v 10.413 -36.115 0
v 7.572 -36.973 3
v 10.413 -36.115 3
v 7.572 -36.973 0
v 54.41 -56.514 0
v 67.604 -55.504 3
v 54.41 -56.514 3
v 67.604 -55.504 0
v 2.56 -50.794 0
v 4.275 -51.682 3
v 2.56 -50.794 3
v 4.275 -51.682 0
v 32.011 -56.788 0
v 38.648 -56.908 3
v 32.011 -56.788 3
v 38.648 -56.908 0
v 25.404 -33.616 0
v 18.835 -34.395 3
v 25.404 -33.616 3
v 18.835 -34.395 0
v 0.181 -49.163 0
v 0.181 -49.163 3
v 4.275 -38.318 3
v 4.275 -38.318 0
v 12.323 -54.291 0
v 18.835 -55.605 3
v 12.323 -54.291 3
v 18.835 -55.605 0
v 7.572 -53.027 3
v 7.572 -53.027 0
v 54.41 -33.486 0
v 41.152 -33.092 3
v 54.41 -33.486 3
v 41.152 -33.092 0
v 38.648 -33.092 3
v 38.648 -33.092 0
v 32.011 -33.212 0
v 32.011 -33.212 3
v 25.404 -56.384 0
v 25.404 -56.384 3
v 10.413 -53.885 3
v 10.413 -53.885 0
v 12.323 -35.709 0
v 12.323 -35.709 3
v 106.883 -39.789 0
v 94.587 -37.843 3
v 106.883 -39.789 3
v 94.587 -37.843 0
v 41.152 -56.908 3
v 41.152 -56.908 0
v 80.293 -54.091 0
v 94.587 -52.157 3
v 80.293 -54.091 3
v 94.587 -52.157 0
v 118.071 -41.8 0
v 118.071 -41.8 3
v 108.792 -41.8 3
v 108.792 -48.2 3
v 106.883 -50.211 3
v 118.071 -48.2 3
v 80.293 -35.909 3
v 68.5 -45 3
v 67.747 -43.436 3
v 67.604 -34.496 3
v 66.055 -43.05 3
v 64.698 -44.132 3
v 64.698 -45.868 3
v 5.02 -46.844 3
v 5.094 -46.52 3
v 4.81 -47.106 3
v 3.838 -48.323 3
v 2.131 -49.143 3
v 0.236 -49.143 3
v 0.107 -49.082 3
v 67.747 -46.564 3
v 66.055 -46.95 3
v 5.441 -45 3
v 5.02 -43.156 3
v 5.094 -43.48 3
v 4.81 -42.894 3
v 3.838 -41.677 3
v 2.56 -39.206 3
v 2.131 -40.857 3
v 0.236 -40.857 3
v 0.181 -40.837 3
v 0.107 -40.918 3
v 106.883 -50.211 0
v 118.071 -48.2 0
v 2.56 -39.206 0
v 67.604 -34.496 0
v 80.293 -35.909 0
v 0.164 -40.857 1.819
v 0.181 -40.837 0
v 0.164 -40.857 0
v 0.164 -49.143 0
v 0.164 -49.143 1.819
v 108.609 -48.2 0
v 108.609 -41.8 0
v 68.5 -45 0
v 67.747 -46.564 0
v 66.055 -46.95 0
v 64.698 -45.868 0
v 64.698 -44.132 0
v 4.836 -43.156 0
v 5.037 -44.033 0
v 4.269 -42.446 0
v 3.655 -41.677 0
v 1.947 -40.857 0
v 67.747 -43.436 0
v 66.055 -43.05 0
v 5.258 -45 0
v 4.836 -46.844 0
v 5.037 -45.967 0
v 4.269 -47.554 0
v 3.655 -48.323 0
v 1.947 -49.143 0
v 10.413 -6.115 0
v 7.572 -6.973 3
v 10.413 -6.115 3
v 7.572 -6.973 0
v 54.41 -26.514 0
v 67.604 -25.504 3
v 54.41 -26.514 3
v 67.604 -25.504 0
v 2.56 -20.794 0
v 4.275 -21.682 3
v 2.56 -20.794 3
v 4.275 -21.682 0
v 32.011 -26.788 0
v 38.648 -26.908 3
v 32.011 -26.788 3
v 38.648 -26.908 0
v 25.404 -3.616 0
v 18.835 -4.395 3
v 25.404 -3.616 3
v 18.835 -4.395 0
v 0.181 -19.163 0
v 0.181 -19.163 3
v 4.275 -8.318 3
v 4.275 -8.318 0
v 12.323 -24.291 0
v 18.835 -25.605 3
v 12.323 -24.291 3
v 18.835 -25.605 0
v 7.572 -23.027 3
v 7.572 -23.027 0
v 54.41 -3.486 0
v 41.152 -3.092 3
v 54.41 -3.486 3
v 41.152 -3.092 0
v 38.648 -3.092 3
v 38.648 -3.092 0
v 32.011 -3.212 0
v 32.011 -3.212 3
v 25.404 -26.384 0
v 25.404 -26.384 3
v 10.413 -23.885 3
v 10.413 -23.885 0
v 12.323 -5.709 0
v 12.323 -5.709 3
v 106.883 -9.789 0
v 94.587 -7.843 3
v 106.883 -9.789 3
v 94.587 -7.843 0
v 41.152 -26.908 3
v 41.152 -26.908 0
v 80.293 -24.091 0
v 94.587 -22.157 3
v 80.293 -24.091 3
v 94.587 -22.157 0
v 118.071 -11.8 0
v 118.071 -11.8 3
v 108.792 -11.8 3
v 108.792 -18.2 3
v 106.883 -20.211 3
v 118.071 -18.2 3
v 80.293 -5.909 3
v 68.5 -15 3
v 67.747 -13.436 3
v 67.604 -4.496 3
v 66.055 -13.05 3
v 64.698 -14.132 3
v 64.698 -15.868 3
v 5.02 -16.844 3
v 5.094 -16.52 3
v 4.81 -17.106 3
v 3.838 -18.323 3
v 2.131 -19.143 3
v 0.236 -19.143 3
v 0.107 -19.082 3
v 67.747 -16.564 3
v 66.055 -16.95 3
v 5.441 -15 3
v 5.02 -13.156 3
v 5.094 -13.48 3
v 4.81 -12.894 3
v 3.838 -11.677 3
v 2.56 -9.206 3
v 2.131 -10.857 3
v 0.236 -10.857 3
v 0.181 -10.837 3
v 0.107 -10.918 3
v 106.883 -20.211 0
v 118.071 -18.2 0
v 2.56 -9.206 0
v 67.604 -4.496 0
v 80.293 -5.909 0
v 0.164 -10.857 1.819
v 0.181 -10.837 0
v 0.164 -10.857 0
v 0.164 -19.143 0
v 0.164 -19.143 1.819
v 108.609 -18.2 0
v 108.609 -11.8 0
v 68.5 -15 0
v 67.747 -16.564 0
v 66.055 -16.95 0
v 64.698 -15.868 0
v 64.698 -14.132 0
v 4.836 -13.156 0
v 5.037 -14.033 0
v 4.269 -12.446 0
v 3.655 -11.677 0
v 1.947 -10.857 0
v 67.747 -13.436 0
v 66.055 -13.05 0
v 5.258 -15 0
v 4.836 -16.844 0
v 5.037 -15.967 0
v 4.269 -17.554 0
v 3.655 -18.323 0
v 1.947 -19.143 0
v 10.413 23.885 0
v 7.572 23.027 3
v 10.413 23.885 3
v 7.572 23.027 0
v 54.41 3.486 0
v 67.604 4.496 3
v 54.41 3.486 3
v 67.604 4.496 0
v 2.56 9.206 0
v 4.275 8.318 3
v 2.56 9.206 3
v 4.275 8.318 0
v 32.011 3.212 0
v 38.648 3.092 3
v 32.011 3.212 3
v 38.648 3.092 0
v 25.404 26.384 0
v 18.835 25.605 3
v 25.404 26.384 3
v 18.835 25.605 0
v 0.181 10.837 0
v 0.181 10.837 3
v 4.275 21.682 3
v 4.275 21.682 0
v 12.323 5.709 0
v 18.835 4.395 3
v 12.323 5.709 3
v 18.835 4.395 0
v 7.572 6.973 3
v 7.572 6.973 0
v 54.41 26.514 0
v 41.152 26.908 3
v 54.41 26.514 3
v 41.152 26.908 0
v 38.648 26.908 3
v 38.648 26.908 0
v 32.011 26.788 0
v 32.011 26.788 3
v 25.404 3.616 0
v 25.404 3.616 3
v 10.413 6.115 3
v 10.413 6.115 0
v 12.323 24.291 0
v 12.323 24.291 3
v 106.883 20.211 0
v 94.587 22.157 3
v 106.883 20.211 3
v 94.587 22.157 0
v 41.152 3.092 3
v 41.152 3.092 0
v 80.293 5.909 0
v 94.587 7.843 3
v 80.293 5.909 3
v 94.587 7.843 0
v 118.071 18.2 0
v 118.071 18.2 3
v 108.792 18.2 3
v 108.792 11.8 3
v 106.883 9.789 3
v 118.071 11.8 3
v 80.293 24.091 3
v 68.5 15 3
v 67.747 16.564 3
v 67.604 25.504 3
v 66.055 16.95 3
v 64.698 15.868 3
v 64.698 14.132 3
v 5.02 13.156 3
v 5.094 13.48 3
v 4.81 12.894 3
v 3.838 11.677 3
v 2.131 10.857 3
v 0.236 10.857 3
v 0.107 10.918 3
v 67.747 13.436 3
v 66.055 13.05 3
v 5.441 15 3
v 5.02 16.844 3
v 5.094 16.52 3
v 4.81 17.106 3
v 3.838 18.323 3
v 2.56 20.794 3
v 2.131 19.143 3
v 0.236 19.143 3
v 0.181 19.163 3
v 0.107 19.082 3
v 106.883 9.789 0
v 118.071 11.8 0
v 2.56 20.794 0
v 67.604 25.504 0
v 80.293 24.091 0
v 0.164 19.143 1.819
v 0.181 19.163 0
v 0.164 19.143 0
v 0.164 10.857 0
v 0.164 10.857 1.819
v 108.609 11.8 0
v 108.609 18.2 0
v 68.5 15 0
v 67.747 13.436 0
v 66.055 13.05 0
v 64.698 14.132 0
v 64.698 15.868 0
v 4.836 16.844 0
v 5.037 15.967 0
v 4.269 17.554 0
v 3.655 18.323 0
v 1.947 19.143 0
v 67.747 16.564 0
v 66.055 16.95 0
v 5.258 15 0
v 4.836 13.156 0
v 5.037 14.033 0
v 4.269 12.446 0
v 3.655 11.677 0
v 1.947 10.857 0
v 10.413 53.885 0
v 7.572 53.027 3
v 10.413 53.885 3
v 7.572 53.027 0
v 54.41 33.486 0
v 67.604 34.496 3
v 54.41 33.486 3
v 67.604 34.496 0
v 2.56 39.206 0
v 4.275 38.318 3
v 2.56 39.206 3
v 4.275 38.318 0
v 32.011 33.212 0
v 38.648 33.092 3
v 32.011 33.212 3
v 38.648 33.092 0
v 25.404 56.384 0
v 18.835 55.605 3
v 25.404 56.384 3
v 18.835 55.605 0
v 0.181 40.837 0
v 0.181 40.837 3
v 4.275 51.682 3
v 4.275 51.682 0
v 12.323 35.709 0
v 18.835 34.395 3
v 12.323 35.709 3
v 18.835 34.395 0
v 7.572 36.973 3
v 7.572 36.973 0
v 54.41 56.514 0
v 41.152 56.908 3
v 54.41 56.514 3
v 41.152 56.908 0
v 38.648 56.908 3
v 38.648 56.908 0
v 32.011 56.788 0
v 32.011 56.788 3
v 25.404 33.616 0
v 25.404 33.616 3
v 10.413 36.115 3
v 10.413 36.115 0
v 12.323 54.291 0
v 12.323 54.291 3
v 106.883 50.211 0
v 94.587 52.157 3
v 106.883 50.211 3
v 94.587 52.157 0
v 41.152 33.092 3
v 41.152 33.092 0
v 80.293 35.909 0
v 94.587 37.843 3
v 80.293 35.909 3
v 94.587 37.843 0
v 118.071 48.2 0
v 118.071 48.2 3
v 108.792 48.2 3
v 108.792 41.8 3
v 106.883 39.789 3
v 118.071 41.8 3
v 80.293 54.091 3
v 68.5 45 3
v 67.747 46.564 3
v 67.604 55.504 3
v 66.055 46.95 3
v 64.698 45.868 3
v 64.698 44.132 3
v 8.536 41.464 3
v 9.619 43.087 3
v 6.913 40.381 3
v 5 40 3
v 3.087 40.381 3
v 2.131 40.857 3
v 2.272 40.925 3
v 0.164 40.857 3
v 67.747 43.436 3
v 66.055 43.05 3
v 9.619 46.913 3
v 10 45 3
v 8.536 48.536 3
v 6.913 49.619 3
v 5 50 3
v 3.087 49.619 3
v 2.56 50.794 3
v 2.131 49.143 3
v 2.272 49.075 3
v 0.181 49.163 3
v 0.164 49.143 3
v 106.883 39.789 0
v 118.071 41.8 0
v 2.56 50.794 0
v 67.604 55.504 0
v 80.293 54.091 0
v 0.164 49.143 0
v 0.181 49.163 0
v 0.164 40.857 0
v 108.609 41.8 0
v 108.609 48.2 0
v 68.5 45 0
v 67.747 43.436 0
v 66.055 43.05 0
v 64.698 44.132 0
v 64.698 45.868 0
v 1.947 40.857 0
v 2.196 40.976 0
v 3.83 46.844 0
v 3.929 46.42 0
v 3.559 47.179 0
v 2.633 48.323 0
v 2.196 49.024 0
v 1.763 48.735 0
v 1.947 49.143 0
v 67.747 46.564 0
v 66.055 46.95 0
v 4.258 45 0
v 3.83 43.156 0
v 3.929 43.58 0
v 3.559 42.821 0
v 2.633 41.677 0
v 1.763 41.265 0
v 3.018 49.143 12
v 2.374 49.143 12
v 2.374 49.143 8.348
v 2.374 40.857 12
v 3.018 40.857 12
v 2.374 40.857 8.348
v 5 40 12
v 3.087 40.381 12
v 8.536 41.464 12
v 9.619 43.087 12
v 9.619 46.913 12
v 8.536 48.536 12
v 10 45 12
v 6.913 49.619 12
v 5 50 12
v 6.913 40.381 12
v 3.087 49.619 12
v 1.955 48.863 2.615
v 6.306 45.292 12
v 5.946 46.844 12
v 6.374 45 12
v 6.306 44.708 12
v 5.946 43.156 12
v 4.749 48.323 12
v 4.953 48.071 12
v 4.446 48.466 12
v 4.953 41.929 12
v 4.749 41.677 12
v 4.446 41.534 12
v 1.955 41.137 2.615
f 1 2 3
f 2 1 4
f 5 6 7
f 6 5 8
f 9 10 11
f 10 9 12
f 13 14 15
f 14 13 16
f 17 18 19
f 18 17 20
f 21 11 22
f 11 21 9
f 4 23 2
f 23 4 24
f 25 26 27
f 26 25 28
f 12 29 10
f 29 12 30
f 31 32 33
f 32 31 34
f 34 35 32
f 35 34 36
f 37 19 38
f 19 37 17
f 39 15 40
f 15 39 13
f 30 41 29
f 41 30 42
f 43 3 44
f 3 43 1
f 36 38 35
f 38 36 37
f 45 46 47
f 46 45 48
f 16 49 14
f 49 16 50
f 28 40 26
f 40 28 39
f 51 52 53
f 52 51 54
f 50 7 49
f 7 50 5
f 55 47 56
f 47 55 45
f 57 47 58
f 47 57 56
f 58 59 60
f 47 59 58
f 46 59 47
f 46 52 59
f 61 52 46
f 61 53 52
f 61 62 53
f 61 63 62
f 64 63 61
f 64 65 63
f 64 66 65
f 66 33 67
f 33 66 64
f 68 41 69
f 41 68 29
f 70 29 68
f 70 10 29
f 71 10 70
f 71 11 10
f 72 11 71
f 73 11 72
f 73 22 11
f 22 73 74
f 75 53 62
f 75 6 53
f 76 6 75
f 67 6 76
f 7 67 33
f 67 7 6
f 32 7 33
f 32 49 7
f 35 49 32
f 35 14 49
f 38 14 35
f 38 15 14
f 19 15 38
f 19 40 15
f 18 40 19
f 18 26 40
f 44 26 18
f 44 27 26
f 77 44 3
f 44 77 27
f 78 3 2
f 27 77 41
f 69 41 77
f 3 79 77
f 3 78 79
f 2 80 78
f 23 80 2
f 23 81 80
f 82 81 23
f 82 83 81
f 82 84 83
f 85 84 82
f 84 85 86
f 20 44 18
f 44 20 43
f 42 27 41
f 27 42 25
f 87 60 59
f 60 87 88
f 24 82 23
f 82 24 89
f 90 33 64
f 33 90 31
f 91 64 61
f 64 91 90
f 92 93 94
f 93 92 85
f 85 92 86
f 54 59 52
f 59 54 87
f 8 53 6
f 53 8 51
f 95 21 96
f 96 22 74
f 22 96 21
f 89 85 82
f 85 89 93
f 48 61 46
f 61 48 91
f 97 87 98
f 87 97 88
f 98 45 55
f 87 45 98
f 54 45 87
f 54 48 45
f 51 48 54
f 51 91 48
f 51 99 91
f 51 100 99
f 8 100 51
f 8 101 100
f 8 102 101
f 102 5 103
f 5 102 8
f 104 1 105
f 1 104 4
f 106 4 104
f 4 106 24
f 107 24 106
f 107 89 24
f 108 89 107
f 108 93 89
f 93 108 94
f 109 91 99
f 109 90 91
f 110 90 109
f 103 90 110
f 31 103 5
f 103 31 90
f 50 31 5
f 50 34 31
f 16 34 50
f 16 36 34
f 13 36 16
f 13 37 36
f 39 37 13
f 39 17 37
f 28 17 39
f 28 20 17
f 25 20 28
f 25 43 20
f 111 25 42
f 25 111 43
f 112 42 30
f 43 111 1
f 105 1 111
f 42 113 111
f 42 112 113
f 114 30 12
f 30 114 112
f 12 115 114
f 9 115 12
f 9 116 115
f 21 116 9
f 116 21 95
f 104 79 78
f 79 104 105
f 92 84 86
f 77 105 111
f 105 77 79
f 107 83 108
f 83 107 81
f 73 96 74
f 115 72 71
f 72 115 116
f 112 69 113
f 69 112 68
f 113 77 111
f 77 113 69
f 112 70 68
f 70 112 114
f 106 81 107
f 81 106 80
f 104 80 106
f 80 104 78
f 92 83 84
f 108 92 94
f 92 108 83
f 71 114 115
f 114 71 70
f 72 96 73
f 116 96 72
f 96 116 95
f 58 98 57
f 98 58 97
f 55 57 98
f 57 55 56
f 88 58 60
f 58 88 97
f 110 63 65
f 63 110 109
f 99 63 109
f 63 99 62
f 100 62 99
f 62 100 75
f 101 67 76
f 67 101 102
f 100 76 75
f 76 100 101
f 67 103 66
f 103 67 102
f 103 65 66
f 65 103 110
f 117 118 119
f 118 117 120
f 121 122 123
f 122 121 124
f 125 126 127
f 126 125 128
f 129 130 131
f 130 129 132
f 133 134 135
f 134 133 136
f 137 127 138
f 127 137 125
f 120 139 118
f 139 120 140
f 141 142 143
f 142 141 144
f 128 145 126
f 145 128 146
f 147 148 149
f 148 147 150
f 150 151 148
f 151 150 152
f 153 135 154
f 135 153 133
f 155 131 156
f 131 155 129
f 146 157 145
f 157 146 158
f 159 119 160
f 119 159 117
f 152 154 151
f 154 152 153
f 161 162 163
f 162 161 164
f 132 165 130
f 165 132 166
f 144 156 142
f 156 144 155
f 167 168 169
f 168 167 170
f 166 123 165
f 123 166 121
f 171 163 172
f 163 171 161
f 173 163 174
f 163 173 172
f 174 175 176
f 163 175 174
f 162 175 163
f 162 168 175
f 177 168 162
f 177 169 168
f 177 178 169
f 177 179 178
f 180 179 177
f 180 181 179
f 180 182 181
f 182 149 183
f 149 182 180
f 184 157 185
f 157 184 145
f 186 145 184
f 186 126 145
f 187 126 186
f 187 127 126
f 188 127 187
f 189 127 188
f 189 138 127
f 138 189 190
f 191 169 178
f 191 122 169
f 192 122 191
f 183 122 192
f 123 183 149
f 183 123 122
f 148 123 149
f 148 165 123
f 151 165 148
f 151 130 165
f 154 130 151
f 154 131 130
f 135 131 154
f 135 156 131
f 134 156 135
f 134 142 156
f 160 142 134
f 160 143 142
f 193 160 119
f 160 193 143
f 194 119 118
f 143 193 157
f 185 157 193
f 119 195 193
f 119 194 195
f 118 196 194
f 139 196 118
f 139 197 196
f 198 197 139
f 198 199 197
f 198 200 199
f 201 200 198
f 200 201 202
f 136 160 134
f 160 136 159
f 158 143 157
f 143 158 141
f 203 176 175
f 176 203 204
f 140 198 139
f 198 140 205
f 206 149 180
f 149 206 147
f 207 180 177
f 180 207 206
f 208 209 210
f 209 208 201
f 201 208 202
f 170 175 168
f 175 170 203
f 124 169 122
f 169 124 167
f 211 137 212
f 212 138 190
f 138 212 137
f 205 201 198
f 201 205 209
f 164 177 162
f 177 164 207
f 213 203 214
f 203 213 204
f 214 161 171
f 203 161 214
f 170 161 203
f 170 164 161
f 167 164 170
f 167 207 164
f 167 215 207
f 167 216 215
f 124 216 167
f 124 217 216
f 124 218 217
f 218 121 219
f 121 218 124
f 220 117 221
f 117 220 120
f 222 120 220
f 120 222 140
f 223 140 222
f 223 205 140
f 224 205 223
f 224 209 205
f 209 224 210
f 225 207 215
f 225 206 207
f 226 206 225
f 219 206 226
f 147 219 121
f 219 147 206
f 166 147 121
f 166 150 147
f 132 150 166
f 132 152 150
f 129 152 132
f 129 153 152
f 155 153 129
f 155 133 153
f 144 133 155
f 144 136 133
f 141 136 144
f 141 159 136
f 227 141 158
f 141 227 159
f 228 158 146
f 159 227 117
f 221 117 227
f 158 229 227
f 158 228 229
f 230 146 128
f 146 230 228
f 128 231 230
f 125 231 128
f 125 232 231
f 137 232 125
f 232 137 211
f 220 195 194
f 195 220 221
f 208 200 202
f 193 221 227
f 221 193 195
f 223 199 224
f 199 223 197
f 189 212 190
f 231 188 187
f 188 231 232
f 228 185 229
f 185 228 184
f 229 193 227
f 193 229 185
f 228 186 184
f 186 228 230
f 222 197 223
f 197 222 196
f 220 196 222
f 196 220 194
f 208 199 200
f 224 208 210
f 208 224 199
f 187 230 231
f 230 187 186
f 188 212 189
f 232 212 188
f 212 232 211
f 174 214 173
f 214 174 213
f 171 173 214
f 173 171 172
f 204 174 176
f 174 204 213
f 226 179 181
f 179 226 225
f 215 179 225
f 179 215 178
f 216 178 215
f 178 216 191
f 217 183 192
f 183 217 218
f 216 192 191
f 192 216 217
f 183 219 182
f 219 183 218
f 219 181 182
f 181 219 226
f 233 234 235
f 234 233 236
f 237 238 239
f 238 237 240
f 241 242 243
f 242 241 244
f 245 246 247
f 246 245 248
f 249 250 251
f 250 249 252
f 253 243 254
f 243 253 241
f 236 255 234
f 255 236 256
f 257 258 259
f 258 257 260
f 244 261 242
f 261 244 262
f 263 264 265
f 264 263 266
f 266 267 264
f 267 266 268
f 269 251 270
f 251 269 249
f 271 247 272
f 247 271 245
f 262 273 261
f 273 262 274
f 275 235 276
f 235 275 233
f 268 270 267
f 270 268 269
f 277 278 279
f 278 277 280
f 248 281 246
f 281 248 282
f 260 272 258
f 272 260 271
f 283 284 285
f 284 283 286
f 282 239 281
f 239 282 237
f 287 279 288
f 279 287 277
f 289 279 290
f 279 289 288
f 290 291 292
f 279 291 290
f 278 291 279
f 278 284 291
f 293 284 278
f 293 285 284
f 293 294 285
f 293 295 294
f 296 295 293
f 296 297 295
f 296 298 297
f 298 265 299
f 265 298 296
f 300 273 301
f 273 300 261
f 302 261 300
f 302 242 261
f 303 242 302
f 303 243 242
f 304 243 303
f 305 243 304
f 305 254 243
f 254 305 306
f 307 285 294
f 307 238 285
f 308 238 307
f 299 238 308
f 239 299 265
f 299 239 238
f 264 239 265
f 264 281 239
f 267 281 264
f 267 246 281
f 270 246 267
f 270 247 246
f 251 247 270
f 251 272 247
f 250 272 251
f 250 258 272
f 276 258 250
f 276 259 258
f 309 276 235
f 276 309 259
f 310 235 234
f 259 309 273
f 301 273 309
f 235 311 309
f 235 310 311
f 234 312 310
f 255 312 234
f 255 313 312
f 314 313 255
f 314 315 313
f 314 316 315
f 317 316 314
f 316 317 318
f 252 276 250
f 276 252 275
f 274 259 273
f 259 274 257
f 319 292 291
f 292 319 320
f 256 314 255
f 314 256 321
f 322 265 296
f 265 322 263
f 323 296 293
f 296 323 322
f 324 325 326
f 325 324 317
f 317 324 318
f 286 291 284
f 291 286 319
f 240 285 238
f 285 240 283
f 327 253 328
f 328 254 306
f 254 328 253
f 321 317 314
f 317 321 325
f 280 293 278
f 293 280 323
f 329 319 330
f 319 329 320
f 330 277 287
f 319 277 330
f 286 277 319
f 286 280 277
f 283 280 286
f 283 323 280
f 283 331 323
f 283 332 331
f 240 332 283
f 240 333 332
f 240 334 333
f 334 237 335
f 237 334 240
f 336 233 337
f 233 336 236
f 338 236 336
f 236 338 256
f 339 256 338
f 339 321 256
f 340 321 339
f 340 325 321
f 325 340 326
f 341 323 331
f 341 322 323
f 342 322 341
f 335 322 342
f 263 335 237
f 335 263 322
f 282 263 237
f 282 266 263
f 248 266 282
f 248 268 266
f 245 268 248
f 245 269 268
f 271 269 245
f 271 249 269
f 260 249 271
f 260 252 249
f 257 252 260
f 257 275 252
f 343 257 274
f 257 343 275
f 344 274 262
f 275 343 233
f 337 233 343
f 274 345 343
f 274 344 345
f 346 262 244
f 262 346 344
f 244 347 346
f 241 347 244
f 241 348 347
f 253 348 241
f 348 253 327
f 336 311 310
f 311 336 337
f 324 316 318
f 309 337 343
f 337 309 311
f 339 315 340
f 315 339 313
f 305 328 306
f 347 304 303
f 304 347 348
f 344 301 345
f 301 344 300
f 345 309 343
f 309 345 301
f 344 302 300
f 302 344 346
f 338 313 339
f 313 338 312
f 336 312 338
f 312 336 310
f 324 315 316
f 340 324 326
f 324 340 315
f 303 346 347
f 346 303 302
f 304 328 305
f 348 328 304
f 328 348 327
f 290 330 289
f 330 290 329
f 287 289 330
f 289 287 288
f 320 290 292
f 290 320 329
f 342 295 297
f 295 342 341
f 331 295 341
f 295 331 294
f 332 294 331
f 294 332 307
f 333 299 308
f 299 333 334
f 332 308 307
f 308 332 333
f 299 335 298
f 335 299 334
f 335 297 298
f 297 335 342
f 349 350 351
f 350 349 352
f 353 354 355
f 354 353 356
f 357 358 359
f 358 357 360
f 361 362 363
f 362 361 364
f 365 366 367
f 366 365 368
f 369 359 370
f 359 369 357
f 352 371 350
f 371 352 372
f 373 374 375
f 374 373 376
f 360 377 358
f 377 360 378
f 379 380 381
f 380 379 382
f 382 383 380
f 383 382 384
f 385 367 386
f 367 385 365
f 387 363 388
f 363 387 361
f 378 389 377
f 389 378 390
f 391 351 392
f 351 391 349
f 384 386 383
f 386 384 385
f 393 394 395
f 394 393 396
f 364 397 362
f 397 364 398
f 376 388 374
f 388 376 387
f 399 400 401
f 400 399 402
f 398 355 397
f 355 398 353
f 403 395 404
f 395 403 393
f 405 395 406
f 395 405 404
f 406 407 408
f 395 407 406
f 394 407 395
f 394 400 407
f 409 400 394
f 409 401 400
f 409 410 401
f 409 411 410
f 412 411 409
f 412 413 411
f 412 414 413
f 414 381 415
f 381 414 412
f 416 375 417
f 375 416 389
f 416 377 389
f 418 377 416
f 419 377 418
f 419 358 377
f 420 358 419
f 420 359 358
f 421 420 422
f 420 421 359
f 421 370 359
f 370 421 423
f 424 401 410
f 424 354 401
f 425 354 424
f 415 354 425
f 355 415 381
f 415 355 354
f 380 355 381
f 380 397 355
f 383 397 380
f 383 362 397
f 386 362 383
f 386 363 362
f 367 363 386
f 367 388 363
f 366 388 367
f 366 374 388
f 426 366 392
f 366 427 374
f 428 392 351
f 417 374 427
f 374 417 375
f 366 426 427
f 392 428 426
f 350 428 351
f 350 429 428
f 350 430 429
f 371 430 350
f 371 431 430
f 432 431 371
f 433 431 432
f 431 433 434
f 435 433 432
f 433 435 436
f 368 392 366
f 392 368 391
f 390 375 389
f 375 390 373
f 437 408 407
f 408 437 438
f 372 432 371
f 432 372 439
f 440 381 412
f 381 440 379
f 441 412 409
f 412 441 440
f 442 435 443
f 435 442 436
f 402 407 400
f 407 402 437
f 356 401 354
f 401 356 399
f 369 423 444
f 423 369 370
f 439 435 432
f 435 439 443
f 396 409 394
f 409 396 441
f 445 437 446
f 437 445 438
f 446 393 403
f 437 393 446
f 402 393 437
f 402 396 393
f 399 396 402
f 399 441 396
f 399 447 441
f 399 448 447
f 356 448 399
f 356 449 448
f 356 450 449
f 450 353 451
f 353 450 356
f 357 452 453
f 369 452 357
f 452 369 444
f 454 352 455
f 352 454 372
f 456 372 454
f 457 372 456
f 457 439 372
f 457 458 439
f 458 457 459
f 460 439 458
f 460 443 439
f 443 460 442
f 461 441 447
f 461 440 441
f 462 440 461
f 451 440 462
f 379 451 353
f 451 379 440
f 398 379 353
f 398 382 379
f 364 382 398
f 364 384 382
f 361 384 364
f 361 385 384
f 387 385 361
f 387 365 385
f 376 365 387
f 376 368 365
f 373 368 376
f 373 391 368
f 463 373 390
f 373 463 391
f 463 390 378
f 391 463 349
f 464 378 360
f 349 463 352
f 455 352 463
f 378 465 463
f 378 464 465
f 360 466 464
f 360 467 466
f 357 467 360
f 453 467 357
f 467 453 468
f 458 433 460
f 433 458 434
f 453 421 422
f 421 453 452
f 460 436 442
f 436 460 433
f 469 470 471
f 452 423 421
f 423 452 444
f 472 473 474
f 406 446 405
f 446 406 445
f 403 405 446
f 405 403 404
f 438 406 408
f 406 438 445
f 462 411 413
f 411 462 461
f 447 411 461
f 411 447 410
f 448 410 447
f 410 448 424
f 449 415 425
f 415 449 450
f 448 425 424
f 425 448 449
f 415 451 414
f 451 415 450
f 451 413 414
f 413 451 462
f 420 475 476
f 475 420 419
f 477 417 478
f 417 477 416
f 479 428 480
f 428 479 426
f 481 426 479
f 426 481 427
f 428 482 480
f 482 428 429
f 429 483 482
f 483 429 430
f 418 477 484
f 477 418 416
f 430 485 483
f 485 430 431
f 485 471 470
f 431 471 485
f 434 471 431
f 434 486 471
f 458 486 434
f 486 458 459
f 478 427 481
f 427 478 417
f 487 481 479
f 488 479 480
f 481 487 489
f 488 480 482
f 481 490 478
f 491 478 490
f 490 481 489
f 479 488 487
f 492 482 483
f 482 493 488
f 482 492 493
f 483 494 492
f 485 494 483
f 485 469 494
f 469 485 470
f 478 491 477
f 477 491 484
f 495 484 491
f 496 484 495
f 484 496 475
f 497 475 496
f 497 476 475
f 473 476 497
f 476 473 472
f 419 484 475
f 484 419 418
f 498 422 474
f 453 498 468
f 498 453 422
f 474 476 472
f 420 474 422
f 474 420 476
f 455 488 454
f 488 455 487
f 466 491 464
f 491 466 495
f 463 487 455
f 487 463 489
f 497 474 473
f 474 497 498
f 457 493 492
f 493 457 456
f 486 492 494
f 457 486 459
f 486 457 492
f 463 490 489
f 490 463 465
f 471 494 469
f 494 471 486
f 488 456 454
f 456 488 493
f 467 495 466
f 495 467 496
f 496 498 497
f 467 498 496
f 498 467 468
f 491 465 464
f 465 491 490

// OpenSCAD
// file: naca0018.scad
module naca0018(chord, height)
{
  hull() {
    translate([0.000000 * chord,0,0]) cylinder(r = 0.000000 * chord, h = height);
    translate([0.012500 * chord,0,0]) cylinder(r = 0.028409 * chord, h = height);
    translate([0.025000 * chord,0,0]) cylinder(r = 0.039221 * chord, h = height);
    translate([0.050000 * chord,0,0]) cylinder(r = 0.053320 * chord, h = height);
    translate([0.075000 * chord,0,0]) cylinder(r = 0.062999 * chord, h = height);
    translate([0.100000 * chord,0,0]) cylinder(r = 0.070242 * chord, h = height);
    translate([0.150000 * chord,0,0]) cylinder(r = 0.080177 * chord, h = height);
    translate([0.200000 * chord,0,0]) cylinder(r = 0.086063 * chord, h = height);
    translate([0.250000 * chord,0,0]) cylinder(r = 0.089119 * chord, h = height);
    translate([0.300000 * chord,0,0]) cylinder(r = 0.090026 * chord, h = height);
    translate([0.400000 * chord,0,0]) cylinder(r = 0.087045 * chord, h = height);
    translate([0.500000 * chord,0,0]) cylinder(r = 0.079410 * chord, h = height);
    translate([0.600000 * chord,0,0]) cylinder(r = 0.068451 * chord, h = height);
    translate([0.700000 * chord,0,0]) cylinder(r = 0.054959 * chord, h = height);
    translate([0.800000 * chord,0,0]) cylinder(r = 0.039347 * chord, h = height);
    translate([0.900000 * chord,0,0]) cylinder(r = 0.021716 * chord, h = height);
    translate([0.950000 * chord,0,0]) cylinder(r = 0.012098 * chord, h = height);
    translate([1.000000 * chord,0,0]) cylinder(r = 0.001890 * chord, h = height);
  }
}

naca0018(100, 3);
// file: constants.scad
/*
 * Written by Dermot Tynan, Kalopa Research.
 * GPLv2.
 *
 * This file has all the constants for the OpenWing sail.
 *
 * All dimensions are in mm.
 */

bearing_inner_radius = 4.0;
bearing_outer_radius = 11.0 * 1.02;
bearing_height = 7.0;

mast_clearance_radius = 5.0;

a_section_chord = 133.0;

le_tube_radius = 4.0 * 1.0625;

te_depth = 6.4;
te_width = 20.0;
// main file
/*
 * Written by Dermot Tynan, Kalopa Research.
 * GPLv2.
 *
 * This is the definition for the four mast supports on the lower
 * leading-edge of the mast, A4 -> A7.
 *
 * All dimensions are in mm.
 */
include <constants.scad>

use <naca0018.scad>

module lower_front_support()
{
	difference() {
		naca0018(a_section_chord, 3);
		translate([1, 0, 0]) rotate(a = [0, 3.5, 0]) cylinder(r = le_tube_radius, h = 10, center = true);
		translate([122, 0, 6]) rotate(a = [0, 3.5, 0]) cube([26, te_depth, 20], center = true);
		translate([a_section_chord / 2, 0, 0]) cylinder(r = 2, h = 12, center = true);
	}
}

module lower_top_section()
{
	difference() {
		union() {
			lower_front_support();
			translate([5, 0, 6]) cylinder(r = 5, h = 12, center = true);
		}
		translate([1, 0, 6]) rotate(a = [0, 10, 0]) cylinder(r = le_tube_radius, h = 20, center = true);
	}
}

translate([0, -45, 0]) lower_front_support();
translate([0, -15, 0]) lower_front_support();
translate([0, 15, 0]) lower_front_support();
translate([0, 45, 0]) lower_top_section();
